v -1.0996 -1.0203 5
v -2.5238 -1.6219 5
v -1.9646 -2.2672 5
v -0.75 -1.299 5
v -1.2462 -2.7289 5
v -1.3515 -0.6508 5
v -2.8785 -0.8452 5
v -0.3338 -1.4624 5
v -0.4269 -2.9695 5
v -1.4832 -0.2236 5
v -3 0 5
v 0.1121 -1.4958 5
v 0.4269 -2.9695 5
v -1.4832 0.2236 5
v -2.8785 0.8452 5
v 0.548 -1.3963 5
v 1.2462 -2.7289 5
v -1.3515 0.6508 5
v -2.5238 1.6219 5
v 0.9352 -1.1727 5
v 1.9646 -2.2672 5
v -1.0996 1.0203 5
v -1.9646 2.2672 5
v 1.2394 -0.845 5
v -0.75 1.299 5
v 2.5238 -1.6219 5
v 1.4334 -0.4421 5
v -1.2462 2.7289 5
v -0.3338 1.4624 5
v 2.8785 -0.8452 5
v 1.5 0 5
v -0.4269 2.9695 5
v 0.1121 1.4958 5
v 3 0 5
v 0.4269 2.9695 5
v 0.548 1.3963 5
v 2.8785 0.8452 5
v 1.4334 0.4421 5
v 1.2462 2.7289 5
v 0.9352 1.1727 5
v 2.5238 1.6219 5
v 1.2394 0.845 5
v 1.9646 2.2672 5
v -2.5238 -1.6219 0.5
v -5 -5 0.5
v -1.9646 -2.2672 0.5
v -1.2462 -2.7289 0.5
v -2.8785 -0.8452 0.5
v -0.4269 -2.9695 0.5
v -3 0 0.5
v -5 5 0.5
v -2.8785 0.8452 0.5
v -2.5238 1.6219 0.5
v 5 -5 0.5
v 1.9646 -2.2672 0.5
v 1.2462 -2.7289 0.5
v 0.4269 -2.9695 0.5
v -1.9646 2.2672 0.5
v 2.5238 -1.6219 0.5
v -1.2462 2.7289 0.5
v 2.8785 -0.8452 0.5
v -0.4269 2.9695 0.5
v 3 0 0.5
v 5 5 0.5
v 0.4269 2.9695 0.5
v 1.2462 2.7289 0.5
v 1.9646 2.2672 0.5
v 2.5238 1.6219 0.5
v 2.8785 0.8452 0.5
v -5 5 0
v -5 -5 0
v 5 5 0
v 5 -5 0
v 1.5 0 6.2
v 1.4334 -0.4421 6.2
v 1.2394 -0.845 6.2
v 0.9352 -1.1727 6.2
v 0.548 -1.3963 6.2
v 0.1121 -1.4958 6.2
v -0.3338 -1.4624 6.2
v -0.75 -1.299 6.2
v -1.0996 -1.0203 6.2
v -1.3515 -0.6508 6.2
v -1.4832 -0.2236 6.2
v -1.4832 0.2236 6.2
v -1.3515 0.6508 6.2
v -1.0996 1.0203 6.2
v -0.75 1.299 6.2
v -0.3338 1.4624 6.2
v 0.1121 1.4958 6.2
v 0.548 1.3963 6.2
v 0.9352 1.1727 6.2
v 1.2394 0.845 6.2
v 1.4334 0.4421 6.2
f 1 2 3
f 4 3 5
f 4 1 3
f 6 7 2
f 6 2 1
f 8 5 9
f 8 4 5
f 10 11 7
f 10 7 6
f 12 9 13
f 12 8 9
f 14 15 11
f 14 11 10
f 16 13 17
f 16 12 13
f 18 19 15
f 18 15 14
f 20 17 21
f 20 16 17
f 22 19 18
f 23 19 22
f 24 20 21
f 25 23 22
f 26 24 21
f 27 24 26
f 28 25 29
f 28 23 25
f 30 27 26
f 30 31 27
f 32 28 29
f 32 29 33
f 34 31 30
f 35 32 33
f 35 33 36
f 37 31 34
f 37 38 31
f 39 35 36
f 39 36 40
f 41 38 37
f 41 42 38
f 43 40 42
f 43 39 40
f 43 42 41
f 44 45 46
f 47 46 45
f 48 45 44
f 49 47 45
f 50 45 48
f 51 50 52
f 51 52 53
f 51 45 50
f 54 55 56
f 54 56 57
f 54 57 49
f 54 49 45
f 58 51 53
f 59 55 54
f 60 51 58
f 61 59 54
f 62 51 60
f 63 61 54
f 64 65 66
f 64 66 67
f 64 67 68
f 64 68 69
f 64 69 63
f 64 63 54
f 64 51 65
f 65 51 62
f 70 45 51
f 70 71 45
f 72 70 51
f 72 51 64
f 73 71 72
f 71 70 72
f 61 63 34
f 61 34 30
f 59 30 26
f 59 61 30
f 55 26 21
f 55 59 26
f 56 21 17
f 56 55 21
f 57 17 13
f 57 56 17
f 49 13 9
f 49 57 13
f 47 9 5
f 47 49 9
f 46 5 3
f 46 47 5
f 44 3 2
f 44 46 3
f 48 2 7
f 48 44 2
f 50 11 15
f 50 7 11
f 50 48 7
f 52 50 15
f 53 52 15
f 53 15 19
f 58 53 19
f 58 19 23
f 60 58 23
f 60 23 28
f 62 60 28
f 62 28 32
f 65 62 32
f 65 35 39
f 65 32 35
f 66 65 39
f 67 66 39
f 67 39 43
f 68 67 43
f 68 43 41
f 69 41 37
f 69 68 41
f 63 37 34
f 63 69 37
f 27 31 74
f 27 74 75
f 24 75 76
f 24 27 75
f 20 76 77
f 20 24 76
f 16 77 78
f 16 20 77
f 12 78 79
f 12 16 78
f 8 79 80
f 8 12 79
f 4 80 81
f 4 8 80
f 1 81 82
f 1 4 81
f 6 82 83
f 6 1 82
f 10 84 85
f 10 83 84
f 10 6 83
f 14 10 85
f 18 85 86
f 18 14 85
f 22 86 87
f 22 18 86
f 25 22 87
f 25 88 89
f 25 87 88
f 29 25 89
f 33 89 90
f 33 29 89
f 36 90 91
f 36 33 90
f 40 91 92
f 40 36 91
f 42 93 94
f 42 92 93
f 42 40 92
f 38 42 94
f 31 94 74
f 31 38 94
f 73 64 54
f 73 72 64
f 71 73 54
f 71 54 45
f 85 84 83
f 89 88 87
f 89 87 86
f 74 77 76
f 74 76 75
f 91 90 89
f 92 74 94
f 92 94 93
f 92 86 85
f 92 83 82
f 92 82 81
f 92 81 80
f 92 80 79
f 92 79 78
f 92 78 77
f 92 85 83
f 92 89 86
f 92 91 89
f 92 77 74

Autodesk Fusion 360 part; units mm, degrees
sketch "Skizze1" plane through (0, 0, 0) normal (0, 0, 1) x (1, 0, 0)
  circle A0 centre (0, 0) radius 3
  circle A1 centre (0, 0) radius 1.5
  dimension "d1" = 6
  dimension "d2" = 3
extrude "Extrusion1" add sketch "Skizze1" along normal blind 5
extrude "Extrusion2" add sketch "Skizze1" along normal blind 6.2 contours A1
sketch "Skizze2" plane through (0, 0, 0) normal (0, 0, 1) x (1, 0, 0)
  line L0 (-5, 5) -> (5, 5)
  line L1 (5, 5) -> (5, -5)
  line L2 (5, -5) -> (-5, -5)
  line L3 (-5, -5) -> (-5, 5)
  dimension "d9" = 10
extrude "Extrusion3" add sketch "Skizze2" along normal blind 0.5
equation "d5 = 5 mm + ( 0.12 * 10 ) * 1 mm"
